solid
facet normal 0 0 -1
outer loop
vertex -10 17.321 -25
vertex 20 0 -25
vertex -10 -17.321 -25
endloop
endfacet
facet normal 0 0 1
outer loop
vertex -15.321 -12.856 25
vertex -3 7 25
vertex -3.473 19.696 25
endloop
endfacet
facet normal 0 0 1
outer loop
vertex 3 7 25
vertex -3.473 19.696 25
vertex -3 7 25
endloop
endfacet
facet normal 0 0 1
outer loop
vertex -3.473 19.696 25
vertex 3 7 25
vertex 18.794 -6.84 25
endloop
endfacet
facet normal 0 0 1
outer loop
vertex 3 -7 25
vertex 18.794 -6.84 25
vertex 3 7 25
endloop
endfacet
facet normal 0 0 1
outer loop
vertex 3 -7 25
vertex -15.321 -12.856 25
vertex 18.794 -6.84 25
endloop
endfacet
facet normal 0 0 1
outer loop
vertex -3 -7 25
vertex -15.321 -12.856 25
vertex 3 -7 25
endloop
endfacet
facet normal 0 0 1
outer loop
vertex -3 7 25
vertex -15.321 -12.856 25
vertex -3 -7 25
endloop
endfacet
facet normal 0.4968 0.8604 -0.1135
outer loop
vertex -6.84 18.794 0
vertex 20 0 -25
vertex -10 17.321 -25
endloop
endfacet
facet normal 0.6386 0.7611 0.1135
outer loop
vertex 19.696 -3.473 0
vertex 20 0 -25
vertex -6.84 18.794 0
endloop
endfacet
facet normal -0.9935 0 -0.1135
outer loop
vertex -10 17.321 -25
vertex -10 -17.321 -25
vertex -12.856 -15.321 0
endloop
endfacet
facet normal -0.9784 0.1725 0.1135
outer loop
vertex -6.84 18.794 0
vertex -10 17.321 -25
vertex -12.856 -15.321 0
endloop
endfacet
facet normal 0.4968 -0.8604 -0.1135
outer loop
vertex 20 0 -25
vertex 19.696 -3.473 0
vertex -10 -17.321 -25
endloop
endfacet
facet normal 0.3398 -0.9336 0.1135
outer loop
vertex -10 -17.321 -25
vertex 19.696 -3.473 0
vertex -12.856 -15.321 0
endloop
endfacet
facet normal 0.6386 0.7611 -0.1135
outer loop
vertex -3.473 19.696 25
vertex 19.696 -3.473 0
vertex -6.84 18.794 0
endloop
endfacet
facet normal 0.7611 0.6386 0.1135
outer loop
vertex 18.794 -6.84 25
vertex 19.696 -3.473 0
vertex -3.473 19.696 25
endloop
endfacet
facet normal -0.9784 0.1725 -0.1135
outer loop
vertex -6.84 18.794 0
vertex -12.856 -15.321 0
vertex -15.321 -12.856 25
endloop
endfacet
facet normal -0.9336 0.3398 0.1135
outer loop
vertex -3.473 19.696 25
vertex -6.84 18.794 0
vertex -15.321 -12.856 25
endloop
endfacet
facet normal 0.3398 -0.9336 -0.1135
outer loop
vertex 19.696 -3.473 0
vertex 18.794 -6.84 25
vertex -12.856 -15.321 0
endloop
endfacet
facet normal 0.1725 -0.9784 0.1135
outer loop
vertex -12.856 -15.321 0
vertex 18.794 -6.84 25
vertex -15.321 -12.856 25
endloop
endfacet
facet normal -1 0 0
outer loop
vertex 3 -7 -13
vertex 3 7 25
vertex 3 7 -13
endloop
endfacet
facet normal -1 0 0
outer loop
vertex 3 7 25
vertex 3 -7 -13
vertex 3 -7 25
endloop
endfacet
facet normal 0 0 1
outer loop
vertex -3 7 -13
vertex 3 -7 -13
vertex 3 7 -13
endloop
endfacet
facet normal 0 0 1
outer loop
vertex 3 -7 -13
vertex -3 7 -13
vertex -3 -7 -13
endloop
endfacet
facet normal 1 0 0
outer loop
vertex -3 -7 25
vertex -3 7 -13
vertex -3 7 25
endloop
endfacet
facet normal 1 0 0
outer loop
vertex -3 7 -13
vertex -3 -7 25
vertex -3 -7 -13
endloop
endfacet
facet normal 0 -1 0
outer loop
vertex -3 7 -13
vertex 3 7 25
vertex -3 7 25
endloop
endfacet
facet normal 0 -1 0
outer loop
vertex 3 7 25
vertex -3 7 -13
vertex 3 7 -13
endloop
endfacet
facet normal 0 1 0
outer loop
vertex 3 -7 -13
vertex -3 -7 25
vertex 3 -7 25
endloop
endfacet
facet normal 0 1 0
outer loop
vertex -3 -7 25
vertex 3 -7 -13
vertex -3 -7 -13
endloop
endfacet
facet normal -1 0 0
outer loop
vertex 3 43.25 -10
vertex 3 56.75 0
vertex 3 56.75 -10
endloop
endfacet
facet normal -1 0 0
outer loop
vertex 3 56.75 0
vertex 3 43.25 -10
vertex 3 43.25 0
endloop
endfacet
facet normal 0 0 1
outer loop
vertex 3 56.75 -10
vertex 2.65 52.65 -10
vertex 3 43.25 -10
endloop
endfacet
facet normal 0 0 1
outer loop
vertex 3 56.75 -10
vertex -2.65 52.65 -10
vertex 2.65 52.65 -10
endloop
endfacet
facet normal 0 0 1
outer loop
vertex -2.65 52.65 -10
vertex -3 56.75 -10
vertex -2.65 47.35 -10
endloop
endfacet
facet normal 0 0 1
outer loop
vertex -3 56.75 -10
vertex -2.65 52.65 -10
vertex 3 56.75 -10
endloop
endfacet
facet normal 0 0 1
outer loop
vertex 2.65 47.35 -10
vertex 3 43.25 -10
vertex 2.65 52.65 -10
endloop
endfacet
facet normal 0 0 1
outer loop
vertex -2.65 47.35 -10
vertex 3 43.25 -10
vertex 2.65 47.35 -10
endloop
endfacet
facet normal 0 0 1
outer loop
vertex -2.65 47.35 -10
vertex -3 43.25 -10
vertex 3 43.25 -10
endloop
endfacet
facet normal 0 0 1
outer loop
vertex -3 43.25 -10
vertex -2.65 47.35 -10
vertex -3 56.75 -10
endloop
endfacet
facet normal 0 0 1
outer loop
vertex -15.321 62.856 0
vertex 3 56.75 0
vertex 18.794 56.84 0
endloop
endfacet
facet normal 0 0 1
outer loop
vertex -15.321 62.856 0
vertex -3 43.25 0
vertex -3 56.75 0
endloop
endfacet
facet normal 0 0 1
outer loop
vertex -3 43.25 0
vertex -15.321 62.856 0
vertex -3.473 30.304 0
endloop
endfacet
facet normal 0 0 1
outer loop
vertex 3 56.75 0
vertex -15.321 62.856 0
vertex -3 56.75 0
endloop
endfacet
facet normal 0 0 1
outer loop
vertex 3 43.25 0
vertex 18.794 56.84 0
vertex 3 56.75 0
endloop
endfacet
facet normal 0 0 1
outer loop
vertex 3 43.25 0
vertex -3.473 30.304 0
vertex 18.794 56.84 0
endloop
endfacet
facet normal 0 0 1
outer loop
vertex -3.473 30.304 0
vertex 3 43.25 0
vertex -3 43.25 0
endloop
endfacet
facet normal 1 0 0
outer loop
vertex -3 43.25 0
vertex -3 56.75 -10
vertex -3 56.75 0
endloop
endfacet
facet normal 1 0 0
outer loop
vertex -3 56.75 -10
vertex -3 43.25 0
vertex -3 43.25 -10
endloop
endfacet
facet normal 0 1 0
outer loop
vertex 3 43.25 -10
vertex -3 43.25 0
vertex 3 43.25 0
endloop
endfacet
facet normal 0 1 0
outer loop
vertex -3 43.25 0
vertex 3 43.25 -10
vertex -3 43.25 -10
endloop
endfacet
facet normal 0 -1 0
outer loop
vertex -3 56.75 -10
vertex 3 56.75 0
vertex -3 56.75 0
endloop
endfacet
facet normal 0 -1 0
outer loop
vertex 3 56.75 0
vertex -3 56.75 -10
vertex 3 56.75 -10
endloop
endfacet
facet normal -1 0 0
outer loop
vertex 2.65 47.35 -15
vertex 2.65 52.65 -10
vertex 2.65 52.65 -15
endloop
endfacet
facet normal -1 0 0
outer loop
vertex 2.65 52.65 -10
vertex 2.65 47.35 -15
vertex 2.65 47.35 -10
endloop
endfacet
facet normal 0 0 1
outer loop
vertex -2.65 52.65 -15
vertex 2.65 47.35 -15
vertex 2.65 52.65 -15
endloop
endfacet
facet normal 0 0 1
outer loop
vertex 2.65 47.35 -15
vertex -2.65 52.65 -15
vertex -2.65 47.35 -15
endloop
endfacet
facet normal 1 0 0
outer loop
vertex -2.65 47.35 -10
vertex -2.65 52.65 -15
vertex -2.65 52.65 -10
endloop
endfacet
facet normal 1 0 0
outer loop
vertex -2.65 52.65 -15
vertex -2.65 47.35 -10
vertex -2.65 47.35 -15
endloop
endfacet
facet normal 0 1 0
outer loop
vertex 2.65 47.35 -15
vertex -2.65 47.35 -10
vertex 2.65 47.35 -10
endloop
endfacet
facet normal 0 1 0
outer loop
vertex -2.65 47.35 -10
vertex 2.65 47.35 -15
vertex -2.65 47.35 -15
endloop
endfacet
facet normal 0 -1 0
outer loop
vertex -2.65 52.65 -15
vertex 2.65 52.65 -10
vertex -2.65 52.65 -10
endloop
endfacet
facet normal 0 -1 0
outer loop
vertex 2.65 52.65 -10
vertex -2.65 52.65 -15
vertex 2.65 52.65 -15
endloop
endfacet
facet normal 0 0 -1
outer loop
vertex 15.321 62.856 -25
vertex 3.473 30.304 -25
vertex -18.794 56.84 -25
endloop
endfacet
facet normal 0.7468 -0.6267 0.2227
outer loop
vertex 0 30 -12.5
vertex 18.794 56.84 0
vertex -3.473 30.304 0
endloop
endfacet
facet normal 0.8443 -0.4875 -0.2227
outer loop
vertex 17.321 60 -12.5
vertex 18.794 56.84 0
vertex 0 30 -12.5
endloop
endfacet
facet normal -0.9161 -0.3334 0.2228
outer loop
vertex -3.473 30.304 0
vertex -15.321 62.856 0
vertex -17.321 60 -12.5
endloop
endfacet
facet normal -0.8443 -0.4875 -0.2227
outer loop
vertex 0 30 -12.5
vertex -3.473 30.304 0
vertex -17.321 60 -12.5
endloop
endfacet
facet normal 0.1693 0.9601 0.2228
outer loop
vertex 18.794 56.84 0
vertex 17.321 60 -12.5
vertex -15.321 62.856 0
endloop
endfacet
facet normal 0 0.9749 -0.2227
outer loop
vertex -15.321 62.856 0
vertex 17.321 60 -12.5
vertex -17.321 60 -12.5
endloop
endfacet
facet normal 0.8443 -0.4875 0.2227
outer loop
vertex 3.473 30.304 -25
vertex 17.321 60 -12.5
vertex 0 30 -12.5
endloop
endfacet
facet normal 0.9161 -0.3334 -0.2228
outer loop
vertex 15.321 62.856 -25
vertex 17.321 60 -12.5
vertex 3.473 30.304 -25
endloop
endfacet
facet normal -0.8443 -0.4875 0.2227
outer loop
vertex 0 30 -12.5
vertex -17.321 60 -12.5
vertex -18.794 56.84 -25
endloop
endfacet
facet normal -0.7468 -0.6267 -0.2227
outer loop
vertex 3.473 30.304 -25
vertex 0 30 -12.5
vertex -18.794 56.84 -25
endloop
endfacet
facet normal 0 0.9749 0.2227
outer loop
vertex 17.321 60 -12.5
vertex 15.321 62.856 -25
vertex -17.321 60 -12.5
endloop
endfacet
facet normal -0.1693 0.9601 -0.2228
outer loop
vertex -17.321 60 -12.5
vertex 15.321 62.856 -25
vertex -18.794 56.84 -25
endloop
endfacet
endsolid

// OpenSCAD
/***********************************************************************
Name ......... : usbCase.scad
Description....: Customizable USB Case
Author ....... : Garrett Melenka
Version ...... : V1.0 2016/12/17
Licence ...... : GPL
***********************************************************************/

//Outer Diameter of Usb Case
diameter = 40;
//Height of Usb Case
usbHeight = 50;
//Height of Use Case Cap
capHeight = 25;

//Measure Dimensions of Usb circuit board
//Width of Circuit portion of usb 
usbCircuitWidth = 14;
//Thickness of circuit portion of usb
usbCircuitThickness = 6;
//Length of Circuit Portion of USB
usbCircuitDepth = 38;

//Measure dimensions of USB/ PC connection
//Width of USB that connects to PC
usbWidth = 13.5;
//THickness of USB that connects to PC
usbThickness = 6;
//Depth USB will fit into cap
usbDepth = 10;


//Add magnet to cap 
magnetSize = 5.3;

//Change the shape of the case
facets = 3; //[3:1:100]
//Add a degree of twist to case
twist = 20;
//Convexity
convex = 0;

module usbCaseBottom()
{
    difference(){
        
    linear_extrude(height = usbHeight, center = true, convexity =convex, twist = twist)
        circle(r=diameter*0.5, $fn=facets);
        
    //cylinder(r = diameter*0.5, h = height, center = true, $fn=facets);
    
    translate([0,0,usbHeight*0.5-usbCircuitDepth*0.5]){
    
    cube(size = [usbCircuitThickness, usbCircuitWidth, usbCircuitDepth], center = true);
    }
    }
}

module usbCaseTop()
{
    
    twistPerHeight = twist / usbHeight;
    
    echo(twistPerHeight);
    
    twistCap = twistPerHeight * capHeight;
    
    
    
    
    difference()
    {
    linear_extrude(height = capHeight, center = true, convexity = convex, twist = twist)     circle(r=diameter*0.5, $fn = facets);    
    //cylinder(r = diameter*0.5, h = capHeight, center = true, $fn = facets);
    
        
    rotate([0,0,twist]){    
        
    translate([0,0,-capHeight*0.5 + usbDepth*0.5]){
    cube(size = [usbThickness,usbWidth, usbDepth], center = true);
    }
    
    translate([0,0,capHeight*0.5-magnetSize*0.5-usbDepth]){
    cube(size = [magnetSize, magnetSize, magnetSize], center = true);
    }
    }
    
    
}

    
}

usbCaseBottom();



//translate([0,0,usbHeight*0.5+capHeight*0.5+10])
translate([0, diameter+10, -capHeight*0.5])
{
    
 rotate([180,0,0]){
    
 rotate([0,0,-twist])
    {
 //mirror([1,0,0])
     {    
usbCaseTop();
 }
}
}
}
